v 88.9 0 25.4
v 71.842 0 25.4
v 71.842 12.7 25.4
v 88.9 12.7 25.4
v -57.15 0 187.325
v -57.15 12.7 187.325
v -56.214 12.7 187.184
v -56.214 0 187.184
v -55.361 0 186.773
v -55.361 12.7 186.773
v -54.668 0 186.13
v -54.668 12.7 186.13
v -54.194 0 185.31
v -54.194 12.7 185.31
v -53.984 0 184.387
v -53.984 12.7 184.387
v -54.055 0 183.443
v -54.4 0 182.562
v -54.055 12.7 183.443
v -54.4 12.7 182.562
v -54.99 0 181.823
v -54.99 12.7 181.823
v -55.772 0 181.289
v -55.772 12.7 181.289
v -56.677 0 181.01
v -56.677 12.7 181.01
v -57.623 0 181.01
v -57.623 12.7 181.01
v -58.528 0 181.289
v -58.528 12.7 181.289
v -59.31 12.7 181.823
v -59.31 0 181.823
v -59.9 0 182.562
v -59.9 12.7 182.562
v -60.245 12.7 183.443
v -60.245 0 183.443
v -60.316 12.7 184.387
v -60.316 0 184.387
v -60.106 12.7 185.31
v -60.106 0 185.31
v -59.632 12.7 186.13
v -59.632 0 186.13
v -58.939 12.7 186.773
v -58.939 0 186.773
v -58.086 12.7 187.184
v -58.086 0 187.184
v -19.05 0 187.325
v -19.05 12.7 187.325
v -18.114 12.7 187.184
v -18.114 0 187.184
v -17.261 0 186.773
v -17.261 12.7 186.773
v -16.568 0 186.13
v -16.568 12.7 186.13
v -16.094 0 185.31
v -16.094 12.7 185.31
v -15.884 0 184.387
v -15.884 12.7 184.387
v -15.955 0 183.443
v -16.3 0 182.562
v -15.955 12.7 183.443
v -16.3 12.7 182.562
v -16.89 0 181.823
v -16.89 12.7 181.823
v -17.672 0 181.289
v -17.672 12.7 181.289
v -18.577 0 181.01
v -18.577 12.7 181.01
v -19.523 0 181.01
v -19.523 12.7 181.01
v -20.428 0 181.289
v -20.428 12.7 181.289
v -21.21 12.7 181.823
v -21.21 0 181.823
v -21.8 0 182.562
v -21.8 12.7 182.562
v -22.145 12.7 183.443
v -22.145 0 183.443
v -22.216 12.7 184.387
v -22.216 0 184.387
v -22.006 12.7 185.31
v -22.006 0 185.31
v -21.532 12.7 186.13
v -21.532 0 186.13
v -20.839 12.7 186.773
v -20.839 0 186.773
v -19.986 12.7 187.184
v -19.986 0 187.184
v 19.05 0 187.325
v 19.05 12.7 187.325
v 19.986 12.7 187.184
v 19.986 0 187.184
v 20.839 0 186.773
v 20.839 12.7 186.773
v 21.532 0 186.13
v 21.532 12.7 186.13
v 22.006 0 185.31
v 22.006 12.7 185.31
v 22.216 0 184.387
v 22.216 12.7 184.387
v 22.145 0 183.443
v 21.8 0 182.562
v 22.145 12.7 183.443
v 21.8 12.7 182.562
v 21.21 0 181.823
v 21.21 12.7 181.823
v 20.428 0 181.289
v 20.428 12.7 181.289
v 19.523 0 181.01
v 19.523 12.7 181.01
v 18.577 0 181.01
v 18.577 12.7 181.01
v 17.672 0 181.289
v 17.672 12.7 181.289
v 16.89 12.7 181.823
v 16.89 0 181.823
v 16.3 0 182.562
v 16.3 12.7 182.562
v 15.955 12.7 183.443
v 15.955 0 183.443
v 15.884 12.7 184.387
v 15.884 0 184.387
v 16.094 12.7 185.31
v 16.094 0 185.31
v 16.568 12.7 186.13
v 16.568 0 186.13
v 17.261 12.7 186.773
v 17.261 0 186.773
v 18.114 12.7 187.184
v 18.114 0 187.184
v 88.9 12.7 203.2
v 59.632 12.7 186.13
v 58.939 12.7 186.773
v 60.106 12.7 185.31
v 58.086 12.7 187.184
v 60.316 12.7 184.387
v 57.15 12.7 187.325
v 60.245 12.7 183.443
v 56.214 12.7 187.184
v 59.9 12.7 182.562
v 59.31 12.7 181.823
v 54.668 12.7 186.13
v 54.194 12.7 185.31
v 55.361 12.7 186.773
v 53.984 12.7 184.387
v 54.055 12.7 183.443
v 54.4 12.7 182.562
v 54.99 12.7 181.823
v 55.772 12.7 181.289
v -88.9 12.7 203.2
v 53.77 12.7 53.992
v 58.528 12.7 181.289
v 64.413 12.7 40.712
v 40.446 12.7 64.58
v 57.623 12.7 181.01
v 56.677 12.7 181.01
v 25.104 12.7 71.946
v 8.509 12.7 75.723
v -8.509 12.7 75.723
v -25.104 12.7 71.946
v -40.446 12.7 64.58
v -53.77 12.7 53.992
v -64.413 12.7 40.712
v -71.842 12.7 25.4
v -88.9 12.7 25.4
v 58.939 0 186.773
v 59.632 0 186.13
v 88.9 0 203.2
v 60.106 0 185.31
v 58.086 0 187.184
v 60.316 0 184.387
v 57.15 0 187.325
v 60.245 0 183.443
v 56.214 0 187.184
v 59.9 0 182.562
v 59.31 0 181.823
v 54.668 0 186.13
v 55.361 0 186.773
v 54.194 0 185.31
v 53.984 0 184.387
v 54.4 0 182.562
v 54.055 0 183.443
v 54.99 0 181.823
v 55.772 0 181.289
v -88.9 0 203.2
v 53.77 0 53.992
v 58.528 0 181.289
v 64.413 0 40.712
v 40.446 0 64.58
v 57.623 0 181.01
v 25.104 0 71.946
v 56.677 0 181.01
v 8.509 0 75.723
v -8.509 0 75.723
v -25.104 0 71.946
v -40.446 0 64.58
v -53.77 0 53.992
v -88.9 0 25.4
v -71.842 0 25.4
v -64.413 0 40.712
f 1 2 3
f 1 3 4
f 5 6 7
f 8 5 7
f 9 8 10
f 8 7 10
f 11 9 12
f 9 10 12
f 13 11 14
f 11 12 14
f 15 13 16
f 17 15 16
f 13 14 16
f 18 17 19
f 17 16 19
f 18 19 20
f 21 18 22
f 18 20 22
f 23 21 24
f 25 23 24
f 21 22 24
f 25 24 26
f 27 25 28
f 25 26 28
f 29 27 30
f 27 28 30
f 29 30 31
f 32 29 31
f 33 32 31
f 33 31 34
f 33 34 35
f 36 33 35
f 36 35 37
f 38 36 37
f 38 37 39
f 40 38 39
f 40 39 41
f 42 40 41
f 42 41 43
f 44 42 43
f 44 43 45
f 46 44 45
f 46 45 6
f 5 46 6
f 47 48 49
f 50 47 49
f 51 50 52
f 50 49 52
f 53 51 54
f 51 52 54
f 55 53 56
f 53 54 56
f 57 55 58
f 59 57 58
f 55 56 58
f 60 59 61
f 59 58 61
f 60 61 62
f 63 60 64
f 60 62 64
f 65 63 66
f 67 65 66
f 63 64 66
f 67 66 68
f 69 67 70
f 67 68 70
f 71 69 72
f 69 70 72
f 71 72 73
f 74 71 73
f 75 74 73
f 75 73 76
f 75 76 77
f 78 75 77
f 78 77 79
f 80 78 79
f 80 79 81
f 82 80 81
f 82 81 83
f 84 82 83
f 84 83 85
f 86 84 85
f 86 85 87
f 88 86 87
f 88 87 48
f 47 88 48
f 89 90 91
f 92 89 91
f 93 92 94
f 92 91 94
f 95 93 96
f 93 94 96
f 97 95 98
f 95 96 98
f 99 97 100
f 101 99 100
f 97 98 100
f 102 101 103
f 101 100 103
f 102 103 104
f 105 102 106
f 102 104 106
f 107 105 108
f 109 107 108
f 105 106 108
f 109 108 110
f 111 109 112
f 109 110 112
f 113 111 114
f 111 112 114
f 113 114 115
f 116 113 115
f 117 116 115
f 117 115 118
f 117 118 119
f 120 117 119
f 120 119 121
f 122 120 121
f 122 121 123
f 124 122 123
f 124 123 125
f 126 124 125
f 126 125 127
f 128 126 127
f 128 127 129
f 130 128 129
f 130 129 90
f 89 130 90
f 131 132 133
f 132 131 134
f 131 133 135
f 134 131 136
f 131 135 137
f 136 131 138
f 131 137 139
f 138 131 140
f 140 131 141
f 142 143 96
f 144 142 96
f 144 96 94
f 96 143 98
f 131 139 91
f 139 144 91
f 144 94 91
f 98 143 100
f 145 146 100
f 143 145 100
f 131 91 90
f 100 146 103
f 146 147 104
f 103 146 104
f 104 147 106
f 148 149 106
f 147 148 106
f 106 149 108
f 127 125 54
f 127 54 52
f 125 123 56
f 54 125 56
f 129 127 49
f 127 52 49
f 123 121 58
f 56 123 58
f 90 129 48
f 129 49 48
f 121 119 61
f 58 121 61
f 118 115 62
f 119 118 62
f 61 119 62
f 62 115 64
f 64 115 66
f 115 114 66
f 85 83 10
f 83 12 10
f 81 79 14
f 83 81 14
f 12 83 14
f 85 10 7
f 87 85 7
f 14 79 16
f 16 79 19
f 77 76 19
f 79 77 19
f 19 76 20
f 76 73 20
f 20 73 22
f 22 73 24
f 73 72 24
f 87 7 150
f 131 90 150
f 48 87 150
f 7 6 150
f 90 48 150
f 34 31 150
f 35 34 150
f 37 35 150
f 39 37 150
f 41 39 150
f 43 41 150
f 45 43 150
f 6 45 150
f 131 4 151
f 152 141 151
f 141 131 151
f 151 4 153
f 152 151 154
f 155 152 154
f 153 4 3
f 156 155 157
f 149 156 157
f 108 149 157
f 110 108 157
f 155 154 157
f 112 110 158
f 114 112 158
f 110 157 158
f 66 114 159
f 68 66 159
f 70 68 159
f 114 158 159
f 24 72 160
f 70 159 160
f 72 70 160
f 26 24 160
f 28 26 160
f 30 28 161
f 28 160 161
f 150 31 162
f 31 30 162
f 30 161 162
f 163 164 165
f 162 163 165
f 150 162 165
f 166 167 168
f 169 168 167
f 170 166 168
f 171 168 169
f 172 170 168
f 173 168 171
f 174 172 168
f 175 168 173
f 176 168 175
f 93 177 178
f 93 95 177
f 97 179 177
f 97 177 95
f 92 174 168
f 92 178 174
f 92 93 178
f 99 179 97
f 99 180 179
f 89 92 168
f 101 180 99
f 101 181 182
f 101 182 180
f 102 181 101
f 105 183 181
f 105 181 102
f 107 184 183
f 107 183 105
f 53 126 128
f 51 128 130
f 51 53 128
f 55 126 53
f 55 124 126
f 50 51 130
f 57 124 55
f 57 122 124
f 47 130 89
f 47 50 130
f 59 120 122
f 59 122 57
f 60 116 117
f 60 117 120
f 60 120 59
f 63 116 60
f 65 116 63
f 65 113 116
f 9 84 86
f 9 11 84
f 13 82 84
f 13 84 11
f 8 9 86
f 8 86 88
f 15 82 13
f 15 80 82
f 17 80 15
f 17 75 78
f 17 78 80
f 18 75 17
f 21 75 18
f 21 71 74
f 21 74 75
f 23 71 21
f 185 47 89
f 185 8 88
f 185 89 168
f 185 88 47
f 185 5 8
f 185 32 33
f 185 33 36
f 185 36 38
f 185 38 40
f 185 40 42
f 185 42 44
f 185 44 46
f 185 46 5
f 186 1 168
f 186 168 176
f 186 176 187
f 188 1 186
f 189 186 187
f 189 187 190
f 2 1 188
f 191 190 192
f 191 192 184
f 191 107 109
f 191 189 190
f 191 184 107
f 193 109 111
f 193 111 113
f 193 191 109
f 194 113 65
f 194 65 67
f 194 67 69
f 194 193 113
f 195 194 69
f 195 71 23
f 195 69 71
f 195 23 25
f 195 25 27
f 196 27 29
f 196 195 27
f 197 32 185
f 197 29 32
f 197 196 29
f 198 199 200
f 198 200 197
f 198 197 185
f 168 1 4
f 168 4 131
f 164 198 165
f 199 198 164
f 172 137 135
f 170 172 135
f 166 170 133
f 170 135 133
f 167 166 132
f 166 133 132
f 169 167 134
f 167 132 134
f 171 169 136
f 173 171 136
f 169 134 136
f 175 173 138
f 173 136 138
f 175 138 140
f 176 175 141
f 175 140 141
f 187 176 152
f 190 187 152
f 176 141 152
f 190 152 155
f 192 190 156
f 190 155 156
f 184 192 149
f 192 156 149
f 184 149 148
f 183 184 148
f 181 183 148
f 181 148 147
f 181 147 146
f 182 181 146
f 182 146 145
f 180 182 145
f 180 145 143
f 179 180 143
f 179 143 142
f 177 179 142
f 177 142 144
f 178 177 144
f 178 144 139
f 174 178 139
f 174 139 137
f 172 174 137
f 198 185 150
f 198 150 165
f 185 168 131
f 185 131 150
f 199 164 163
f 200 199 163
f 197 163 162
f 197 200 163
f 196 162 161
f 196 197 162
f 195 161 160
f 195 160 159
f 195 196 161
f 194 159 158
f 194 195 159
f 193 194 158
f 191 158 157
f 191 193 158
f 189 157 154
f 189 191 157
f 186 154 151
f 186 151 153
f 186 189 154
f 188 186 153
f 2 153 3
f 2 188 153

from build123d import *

# Parameters (mm, degrees)
BOSS_EXTRUDE1_DEPTH = 12.7
SKETCH2_R           = 3.175
CUT_EXTRUDE1_DEPTH  = 223.159267194


with BuildPart() as part:
    # Sketch1 → Boss-Extrude1 (new body)
    with BuildSketch(Plane(origin=(0, 0, 0), x_dir=(1, 0, 0), z_dir=(0, 1, 0))):
        with BuildLine():
            Line((-88.9, -25.4), (-71.842048969, -25.4))
            ThreePointArc((-71.842048969, -25.4), (0, -76.2), (71.842048969, -25.4))
            Line((71.842048969, -25.4), (88.9, -25.4))
            Line((88.9, -25.4), (88.9, -203.2))
            Line((88.9, -203.2), (-88.9, -203.2))
            Line((-88.9, -203.2), (-88.9, -25.4))
        make_face()
    extrude(amount=BOSS_EXTRUDE1_DEPTH)

    # Sketch2 → Cut-Extrude1 (cut, through all)
    with BuildSketch(Plane(origin=(0, 12.7, 0), x_dir=(1, 0, 0), z_dir=(0, 1, 0))):
        with Locations(Location((-19.05, -184.15, 0), (0, 0, 270))):
            Circle(SKETCH2_R)
        with Locations(Location((19.05, -184.15, 0), (0, 0, 270))):
            Circle(SKETCH2_R)
        with Locations(Location((57.15, -184.15, 0), (0, 0, 270))):
            Circle(SKETCH2_R)
        with Locations(Location((-57.15, -184.15, 0), (0, 0, 270))):
            Circle(SKETCH2_R)
    extrude(amount=-CUT_EXTRUDE1_DEPTH, mode=Mode.SUBTRACT)


solid = part.part
